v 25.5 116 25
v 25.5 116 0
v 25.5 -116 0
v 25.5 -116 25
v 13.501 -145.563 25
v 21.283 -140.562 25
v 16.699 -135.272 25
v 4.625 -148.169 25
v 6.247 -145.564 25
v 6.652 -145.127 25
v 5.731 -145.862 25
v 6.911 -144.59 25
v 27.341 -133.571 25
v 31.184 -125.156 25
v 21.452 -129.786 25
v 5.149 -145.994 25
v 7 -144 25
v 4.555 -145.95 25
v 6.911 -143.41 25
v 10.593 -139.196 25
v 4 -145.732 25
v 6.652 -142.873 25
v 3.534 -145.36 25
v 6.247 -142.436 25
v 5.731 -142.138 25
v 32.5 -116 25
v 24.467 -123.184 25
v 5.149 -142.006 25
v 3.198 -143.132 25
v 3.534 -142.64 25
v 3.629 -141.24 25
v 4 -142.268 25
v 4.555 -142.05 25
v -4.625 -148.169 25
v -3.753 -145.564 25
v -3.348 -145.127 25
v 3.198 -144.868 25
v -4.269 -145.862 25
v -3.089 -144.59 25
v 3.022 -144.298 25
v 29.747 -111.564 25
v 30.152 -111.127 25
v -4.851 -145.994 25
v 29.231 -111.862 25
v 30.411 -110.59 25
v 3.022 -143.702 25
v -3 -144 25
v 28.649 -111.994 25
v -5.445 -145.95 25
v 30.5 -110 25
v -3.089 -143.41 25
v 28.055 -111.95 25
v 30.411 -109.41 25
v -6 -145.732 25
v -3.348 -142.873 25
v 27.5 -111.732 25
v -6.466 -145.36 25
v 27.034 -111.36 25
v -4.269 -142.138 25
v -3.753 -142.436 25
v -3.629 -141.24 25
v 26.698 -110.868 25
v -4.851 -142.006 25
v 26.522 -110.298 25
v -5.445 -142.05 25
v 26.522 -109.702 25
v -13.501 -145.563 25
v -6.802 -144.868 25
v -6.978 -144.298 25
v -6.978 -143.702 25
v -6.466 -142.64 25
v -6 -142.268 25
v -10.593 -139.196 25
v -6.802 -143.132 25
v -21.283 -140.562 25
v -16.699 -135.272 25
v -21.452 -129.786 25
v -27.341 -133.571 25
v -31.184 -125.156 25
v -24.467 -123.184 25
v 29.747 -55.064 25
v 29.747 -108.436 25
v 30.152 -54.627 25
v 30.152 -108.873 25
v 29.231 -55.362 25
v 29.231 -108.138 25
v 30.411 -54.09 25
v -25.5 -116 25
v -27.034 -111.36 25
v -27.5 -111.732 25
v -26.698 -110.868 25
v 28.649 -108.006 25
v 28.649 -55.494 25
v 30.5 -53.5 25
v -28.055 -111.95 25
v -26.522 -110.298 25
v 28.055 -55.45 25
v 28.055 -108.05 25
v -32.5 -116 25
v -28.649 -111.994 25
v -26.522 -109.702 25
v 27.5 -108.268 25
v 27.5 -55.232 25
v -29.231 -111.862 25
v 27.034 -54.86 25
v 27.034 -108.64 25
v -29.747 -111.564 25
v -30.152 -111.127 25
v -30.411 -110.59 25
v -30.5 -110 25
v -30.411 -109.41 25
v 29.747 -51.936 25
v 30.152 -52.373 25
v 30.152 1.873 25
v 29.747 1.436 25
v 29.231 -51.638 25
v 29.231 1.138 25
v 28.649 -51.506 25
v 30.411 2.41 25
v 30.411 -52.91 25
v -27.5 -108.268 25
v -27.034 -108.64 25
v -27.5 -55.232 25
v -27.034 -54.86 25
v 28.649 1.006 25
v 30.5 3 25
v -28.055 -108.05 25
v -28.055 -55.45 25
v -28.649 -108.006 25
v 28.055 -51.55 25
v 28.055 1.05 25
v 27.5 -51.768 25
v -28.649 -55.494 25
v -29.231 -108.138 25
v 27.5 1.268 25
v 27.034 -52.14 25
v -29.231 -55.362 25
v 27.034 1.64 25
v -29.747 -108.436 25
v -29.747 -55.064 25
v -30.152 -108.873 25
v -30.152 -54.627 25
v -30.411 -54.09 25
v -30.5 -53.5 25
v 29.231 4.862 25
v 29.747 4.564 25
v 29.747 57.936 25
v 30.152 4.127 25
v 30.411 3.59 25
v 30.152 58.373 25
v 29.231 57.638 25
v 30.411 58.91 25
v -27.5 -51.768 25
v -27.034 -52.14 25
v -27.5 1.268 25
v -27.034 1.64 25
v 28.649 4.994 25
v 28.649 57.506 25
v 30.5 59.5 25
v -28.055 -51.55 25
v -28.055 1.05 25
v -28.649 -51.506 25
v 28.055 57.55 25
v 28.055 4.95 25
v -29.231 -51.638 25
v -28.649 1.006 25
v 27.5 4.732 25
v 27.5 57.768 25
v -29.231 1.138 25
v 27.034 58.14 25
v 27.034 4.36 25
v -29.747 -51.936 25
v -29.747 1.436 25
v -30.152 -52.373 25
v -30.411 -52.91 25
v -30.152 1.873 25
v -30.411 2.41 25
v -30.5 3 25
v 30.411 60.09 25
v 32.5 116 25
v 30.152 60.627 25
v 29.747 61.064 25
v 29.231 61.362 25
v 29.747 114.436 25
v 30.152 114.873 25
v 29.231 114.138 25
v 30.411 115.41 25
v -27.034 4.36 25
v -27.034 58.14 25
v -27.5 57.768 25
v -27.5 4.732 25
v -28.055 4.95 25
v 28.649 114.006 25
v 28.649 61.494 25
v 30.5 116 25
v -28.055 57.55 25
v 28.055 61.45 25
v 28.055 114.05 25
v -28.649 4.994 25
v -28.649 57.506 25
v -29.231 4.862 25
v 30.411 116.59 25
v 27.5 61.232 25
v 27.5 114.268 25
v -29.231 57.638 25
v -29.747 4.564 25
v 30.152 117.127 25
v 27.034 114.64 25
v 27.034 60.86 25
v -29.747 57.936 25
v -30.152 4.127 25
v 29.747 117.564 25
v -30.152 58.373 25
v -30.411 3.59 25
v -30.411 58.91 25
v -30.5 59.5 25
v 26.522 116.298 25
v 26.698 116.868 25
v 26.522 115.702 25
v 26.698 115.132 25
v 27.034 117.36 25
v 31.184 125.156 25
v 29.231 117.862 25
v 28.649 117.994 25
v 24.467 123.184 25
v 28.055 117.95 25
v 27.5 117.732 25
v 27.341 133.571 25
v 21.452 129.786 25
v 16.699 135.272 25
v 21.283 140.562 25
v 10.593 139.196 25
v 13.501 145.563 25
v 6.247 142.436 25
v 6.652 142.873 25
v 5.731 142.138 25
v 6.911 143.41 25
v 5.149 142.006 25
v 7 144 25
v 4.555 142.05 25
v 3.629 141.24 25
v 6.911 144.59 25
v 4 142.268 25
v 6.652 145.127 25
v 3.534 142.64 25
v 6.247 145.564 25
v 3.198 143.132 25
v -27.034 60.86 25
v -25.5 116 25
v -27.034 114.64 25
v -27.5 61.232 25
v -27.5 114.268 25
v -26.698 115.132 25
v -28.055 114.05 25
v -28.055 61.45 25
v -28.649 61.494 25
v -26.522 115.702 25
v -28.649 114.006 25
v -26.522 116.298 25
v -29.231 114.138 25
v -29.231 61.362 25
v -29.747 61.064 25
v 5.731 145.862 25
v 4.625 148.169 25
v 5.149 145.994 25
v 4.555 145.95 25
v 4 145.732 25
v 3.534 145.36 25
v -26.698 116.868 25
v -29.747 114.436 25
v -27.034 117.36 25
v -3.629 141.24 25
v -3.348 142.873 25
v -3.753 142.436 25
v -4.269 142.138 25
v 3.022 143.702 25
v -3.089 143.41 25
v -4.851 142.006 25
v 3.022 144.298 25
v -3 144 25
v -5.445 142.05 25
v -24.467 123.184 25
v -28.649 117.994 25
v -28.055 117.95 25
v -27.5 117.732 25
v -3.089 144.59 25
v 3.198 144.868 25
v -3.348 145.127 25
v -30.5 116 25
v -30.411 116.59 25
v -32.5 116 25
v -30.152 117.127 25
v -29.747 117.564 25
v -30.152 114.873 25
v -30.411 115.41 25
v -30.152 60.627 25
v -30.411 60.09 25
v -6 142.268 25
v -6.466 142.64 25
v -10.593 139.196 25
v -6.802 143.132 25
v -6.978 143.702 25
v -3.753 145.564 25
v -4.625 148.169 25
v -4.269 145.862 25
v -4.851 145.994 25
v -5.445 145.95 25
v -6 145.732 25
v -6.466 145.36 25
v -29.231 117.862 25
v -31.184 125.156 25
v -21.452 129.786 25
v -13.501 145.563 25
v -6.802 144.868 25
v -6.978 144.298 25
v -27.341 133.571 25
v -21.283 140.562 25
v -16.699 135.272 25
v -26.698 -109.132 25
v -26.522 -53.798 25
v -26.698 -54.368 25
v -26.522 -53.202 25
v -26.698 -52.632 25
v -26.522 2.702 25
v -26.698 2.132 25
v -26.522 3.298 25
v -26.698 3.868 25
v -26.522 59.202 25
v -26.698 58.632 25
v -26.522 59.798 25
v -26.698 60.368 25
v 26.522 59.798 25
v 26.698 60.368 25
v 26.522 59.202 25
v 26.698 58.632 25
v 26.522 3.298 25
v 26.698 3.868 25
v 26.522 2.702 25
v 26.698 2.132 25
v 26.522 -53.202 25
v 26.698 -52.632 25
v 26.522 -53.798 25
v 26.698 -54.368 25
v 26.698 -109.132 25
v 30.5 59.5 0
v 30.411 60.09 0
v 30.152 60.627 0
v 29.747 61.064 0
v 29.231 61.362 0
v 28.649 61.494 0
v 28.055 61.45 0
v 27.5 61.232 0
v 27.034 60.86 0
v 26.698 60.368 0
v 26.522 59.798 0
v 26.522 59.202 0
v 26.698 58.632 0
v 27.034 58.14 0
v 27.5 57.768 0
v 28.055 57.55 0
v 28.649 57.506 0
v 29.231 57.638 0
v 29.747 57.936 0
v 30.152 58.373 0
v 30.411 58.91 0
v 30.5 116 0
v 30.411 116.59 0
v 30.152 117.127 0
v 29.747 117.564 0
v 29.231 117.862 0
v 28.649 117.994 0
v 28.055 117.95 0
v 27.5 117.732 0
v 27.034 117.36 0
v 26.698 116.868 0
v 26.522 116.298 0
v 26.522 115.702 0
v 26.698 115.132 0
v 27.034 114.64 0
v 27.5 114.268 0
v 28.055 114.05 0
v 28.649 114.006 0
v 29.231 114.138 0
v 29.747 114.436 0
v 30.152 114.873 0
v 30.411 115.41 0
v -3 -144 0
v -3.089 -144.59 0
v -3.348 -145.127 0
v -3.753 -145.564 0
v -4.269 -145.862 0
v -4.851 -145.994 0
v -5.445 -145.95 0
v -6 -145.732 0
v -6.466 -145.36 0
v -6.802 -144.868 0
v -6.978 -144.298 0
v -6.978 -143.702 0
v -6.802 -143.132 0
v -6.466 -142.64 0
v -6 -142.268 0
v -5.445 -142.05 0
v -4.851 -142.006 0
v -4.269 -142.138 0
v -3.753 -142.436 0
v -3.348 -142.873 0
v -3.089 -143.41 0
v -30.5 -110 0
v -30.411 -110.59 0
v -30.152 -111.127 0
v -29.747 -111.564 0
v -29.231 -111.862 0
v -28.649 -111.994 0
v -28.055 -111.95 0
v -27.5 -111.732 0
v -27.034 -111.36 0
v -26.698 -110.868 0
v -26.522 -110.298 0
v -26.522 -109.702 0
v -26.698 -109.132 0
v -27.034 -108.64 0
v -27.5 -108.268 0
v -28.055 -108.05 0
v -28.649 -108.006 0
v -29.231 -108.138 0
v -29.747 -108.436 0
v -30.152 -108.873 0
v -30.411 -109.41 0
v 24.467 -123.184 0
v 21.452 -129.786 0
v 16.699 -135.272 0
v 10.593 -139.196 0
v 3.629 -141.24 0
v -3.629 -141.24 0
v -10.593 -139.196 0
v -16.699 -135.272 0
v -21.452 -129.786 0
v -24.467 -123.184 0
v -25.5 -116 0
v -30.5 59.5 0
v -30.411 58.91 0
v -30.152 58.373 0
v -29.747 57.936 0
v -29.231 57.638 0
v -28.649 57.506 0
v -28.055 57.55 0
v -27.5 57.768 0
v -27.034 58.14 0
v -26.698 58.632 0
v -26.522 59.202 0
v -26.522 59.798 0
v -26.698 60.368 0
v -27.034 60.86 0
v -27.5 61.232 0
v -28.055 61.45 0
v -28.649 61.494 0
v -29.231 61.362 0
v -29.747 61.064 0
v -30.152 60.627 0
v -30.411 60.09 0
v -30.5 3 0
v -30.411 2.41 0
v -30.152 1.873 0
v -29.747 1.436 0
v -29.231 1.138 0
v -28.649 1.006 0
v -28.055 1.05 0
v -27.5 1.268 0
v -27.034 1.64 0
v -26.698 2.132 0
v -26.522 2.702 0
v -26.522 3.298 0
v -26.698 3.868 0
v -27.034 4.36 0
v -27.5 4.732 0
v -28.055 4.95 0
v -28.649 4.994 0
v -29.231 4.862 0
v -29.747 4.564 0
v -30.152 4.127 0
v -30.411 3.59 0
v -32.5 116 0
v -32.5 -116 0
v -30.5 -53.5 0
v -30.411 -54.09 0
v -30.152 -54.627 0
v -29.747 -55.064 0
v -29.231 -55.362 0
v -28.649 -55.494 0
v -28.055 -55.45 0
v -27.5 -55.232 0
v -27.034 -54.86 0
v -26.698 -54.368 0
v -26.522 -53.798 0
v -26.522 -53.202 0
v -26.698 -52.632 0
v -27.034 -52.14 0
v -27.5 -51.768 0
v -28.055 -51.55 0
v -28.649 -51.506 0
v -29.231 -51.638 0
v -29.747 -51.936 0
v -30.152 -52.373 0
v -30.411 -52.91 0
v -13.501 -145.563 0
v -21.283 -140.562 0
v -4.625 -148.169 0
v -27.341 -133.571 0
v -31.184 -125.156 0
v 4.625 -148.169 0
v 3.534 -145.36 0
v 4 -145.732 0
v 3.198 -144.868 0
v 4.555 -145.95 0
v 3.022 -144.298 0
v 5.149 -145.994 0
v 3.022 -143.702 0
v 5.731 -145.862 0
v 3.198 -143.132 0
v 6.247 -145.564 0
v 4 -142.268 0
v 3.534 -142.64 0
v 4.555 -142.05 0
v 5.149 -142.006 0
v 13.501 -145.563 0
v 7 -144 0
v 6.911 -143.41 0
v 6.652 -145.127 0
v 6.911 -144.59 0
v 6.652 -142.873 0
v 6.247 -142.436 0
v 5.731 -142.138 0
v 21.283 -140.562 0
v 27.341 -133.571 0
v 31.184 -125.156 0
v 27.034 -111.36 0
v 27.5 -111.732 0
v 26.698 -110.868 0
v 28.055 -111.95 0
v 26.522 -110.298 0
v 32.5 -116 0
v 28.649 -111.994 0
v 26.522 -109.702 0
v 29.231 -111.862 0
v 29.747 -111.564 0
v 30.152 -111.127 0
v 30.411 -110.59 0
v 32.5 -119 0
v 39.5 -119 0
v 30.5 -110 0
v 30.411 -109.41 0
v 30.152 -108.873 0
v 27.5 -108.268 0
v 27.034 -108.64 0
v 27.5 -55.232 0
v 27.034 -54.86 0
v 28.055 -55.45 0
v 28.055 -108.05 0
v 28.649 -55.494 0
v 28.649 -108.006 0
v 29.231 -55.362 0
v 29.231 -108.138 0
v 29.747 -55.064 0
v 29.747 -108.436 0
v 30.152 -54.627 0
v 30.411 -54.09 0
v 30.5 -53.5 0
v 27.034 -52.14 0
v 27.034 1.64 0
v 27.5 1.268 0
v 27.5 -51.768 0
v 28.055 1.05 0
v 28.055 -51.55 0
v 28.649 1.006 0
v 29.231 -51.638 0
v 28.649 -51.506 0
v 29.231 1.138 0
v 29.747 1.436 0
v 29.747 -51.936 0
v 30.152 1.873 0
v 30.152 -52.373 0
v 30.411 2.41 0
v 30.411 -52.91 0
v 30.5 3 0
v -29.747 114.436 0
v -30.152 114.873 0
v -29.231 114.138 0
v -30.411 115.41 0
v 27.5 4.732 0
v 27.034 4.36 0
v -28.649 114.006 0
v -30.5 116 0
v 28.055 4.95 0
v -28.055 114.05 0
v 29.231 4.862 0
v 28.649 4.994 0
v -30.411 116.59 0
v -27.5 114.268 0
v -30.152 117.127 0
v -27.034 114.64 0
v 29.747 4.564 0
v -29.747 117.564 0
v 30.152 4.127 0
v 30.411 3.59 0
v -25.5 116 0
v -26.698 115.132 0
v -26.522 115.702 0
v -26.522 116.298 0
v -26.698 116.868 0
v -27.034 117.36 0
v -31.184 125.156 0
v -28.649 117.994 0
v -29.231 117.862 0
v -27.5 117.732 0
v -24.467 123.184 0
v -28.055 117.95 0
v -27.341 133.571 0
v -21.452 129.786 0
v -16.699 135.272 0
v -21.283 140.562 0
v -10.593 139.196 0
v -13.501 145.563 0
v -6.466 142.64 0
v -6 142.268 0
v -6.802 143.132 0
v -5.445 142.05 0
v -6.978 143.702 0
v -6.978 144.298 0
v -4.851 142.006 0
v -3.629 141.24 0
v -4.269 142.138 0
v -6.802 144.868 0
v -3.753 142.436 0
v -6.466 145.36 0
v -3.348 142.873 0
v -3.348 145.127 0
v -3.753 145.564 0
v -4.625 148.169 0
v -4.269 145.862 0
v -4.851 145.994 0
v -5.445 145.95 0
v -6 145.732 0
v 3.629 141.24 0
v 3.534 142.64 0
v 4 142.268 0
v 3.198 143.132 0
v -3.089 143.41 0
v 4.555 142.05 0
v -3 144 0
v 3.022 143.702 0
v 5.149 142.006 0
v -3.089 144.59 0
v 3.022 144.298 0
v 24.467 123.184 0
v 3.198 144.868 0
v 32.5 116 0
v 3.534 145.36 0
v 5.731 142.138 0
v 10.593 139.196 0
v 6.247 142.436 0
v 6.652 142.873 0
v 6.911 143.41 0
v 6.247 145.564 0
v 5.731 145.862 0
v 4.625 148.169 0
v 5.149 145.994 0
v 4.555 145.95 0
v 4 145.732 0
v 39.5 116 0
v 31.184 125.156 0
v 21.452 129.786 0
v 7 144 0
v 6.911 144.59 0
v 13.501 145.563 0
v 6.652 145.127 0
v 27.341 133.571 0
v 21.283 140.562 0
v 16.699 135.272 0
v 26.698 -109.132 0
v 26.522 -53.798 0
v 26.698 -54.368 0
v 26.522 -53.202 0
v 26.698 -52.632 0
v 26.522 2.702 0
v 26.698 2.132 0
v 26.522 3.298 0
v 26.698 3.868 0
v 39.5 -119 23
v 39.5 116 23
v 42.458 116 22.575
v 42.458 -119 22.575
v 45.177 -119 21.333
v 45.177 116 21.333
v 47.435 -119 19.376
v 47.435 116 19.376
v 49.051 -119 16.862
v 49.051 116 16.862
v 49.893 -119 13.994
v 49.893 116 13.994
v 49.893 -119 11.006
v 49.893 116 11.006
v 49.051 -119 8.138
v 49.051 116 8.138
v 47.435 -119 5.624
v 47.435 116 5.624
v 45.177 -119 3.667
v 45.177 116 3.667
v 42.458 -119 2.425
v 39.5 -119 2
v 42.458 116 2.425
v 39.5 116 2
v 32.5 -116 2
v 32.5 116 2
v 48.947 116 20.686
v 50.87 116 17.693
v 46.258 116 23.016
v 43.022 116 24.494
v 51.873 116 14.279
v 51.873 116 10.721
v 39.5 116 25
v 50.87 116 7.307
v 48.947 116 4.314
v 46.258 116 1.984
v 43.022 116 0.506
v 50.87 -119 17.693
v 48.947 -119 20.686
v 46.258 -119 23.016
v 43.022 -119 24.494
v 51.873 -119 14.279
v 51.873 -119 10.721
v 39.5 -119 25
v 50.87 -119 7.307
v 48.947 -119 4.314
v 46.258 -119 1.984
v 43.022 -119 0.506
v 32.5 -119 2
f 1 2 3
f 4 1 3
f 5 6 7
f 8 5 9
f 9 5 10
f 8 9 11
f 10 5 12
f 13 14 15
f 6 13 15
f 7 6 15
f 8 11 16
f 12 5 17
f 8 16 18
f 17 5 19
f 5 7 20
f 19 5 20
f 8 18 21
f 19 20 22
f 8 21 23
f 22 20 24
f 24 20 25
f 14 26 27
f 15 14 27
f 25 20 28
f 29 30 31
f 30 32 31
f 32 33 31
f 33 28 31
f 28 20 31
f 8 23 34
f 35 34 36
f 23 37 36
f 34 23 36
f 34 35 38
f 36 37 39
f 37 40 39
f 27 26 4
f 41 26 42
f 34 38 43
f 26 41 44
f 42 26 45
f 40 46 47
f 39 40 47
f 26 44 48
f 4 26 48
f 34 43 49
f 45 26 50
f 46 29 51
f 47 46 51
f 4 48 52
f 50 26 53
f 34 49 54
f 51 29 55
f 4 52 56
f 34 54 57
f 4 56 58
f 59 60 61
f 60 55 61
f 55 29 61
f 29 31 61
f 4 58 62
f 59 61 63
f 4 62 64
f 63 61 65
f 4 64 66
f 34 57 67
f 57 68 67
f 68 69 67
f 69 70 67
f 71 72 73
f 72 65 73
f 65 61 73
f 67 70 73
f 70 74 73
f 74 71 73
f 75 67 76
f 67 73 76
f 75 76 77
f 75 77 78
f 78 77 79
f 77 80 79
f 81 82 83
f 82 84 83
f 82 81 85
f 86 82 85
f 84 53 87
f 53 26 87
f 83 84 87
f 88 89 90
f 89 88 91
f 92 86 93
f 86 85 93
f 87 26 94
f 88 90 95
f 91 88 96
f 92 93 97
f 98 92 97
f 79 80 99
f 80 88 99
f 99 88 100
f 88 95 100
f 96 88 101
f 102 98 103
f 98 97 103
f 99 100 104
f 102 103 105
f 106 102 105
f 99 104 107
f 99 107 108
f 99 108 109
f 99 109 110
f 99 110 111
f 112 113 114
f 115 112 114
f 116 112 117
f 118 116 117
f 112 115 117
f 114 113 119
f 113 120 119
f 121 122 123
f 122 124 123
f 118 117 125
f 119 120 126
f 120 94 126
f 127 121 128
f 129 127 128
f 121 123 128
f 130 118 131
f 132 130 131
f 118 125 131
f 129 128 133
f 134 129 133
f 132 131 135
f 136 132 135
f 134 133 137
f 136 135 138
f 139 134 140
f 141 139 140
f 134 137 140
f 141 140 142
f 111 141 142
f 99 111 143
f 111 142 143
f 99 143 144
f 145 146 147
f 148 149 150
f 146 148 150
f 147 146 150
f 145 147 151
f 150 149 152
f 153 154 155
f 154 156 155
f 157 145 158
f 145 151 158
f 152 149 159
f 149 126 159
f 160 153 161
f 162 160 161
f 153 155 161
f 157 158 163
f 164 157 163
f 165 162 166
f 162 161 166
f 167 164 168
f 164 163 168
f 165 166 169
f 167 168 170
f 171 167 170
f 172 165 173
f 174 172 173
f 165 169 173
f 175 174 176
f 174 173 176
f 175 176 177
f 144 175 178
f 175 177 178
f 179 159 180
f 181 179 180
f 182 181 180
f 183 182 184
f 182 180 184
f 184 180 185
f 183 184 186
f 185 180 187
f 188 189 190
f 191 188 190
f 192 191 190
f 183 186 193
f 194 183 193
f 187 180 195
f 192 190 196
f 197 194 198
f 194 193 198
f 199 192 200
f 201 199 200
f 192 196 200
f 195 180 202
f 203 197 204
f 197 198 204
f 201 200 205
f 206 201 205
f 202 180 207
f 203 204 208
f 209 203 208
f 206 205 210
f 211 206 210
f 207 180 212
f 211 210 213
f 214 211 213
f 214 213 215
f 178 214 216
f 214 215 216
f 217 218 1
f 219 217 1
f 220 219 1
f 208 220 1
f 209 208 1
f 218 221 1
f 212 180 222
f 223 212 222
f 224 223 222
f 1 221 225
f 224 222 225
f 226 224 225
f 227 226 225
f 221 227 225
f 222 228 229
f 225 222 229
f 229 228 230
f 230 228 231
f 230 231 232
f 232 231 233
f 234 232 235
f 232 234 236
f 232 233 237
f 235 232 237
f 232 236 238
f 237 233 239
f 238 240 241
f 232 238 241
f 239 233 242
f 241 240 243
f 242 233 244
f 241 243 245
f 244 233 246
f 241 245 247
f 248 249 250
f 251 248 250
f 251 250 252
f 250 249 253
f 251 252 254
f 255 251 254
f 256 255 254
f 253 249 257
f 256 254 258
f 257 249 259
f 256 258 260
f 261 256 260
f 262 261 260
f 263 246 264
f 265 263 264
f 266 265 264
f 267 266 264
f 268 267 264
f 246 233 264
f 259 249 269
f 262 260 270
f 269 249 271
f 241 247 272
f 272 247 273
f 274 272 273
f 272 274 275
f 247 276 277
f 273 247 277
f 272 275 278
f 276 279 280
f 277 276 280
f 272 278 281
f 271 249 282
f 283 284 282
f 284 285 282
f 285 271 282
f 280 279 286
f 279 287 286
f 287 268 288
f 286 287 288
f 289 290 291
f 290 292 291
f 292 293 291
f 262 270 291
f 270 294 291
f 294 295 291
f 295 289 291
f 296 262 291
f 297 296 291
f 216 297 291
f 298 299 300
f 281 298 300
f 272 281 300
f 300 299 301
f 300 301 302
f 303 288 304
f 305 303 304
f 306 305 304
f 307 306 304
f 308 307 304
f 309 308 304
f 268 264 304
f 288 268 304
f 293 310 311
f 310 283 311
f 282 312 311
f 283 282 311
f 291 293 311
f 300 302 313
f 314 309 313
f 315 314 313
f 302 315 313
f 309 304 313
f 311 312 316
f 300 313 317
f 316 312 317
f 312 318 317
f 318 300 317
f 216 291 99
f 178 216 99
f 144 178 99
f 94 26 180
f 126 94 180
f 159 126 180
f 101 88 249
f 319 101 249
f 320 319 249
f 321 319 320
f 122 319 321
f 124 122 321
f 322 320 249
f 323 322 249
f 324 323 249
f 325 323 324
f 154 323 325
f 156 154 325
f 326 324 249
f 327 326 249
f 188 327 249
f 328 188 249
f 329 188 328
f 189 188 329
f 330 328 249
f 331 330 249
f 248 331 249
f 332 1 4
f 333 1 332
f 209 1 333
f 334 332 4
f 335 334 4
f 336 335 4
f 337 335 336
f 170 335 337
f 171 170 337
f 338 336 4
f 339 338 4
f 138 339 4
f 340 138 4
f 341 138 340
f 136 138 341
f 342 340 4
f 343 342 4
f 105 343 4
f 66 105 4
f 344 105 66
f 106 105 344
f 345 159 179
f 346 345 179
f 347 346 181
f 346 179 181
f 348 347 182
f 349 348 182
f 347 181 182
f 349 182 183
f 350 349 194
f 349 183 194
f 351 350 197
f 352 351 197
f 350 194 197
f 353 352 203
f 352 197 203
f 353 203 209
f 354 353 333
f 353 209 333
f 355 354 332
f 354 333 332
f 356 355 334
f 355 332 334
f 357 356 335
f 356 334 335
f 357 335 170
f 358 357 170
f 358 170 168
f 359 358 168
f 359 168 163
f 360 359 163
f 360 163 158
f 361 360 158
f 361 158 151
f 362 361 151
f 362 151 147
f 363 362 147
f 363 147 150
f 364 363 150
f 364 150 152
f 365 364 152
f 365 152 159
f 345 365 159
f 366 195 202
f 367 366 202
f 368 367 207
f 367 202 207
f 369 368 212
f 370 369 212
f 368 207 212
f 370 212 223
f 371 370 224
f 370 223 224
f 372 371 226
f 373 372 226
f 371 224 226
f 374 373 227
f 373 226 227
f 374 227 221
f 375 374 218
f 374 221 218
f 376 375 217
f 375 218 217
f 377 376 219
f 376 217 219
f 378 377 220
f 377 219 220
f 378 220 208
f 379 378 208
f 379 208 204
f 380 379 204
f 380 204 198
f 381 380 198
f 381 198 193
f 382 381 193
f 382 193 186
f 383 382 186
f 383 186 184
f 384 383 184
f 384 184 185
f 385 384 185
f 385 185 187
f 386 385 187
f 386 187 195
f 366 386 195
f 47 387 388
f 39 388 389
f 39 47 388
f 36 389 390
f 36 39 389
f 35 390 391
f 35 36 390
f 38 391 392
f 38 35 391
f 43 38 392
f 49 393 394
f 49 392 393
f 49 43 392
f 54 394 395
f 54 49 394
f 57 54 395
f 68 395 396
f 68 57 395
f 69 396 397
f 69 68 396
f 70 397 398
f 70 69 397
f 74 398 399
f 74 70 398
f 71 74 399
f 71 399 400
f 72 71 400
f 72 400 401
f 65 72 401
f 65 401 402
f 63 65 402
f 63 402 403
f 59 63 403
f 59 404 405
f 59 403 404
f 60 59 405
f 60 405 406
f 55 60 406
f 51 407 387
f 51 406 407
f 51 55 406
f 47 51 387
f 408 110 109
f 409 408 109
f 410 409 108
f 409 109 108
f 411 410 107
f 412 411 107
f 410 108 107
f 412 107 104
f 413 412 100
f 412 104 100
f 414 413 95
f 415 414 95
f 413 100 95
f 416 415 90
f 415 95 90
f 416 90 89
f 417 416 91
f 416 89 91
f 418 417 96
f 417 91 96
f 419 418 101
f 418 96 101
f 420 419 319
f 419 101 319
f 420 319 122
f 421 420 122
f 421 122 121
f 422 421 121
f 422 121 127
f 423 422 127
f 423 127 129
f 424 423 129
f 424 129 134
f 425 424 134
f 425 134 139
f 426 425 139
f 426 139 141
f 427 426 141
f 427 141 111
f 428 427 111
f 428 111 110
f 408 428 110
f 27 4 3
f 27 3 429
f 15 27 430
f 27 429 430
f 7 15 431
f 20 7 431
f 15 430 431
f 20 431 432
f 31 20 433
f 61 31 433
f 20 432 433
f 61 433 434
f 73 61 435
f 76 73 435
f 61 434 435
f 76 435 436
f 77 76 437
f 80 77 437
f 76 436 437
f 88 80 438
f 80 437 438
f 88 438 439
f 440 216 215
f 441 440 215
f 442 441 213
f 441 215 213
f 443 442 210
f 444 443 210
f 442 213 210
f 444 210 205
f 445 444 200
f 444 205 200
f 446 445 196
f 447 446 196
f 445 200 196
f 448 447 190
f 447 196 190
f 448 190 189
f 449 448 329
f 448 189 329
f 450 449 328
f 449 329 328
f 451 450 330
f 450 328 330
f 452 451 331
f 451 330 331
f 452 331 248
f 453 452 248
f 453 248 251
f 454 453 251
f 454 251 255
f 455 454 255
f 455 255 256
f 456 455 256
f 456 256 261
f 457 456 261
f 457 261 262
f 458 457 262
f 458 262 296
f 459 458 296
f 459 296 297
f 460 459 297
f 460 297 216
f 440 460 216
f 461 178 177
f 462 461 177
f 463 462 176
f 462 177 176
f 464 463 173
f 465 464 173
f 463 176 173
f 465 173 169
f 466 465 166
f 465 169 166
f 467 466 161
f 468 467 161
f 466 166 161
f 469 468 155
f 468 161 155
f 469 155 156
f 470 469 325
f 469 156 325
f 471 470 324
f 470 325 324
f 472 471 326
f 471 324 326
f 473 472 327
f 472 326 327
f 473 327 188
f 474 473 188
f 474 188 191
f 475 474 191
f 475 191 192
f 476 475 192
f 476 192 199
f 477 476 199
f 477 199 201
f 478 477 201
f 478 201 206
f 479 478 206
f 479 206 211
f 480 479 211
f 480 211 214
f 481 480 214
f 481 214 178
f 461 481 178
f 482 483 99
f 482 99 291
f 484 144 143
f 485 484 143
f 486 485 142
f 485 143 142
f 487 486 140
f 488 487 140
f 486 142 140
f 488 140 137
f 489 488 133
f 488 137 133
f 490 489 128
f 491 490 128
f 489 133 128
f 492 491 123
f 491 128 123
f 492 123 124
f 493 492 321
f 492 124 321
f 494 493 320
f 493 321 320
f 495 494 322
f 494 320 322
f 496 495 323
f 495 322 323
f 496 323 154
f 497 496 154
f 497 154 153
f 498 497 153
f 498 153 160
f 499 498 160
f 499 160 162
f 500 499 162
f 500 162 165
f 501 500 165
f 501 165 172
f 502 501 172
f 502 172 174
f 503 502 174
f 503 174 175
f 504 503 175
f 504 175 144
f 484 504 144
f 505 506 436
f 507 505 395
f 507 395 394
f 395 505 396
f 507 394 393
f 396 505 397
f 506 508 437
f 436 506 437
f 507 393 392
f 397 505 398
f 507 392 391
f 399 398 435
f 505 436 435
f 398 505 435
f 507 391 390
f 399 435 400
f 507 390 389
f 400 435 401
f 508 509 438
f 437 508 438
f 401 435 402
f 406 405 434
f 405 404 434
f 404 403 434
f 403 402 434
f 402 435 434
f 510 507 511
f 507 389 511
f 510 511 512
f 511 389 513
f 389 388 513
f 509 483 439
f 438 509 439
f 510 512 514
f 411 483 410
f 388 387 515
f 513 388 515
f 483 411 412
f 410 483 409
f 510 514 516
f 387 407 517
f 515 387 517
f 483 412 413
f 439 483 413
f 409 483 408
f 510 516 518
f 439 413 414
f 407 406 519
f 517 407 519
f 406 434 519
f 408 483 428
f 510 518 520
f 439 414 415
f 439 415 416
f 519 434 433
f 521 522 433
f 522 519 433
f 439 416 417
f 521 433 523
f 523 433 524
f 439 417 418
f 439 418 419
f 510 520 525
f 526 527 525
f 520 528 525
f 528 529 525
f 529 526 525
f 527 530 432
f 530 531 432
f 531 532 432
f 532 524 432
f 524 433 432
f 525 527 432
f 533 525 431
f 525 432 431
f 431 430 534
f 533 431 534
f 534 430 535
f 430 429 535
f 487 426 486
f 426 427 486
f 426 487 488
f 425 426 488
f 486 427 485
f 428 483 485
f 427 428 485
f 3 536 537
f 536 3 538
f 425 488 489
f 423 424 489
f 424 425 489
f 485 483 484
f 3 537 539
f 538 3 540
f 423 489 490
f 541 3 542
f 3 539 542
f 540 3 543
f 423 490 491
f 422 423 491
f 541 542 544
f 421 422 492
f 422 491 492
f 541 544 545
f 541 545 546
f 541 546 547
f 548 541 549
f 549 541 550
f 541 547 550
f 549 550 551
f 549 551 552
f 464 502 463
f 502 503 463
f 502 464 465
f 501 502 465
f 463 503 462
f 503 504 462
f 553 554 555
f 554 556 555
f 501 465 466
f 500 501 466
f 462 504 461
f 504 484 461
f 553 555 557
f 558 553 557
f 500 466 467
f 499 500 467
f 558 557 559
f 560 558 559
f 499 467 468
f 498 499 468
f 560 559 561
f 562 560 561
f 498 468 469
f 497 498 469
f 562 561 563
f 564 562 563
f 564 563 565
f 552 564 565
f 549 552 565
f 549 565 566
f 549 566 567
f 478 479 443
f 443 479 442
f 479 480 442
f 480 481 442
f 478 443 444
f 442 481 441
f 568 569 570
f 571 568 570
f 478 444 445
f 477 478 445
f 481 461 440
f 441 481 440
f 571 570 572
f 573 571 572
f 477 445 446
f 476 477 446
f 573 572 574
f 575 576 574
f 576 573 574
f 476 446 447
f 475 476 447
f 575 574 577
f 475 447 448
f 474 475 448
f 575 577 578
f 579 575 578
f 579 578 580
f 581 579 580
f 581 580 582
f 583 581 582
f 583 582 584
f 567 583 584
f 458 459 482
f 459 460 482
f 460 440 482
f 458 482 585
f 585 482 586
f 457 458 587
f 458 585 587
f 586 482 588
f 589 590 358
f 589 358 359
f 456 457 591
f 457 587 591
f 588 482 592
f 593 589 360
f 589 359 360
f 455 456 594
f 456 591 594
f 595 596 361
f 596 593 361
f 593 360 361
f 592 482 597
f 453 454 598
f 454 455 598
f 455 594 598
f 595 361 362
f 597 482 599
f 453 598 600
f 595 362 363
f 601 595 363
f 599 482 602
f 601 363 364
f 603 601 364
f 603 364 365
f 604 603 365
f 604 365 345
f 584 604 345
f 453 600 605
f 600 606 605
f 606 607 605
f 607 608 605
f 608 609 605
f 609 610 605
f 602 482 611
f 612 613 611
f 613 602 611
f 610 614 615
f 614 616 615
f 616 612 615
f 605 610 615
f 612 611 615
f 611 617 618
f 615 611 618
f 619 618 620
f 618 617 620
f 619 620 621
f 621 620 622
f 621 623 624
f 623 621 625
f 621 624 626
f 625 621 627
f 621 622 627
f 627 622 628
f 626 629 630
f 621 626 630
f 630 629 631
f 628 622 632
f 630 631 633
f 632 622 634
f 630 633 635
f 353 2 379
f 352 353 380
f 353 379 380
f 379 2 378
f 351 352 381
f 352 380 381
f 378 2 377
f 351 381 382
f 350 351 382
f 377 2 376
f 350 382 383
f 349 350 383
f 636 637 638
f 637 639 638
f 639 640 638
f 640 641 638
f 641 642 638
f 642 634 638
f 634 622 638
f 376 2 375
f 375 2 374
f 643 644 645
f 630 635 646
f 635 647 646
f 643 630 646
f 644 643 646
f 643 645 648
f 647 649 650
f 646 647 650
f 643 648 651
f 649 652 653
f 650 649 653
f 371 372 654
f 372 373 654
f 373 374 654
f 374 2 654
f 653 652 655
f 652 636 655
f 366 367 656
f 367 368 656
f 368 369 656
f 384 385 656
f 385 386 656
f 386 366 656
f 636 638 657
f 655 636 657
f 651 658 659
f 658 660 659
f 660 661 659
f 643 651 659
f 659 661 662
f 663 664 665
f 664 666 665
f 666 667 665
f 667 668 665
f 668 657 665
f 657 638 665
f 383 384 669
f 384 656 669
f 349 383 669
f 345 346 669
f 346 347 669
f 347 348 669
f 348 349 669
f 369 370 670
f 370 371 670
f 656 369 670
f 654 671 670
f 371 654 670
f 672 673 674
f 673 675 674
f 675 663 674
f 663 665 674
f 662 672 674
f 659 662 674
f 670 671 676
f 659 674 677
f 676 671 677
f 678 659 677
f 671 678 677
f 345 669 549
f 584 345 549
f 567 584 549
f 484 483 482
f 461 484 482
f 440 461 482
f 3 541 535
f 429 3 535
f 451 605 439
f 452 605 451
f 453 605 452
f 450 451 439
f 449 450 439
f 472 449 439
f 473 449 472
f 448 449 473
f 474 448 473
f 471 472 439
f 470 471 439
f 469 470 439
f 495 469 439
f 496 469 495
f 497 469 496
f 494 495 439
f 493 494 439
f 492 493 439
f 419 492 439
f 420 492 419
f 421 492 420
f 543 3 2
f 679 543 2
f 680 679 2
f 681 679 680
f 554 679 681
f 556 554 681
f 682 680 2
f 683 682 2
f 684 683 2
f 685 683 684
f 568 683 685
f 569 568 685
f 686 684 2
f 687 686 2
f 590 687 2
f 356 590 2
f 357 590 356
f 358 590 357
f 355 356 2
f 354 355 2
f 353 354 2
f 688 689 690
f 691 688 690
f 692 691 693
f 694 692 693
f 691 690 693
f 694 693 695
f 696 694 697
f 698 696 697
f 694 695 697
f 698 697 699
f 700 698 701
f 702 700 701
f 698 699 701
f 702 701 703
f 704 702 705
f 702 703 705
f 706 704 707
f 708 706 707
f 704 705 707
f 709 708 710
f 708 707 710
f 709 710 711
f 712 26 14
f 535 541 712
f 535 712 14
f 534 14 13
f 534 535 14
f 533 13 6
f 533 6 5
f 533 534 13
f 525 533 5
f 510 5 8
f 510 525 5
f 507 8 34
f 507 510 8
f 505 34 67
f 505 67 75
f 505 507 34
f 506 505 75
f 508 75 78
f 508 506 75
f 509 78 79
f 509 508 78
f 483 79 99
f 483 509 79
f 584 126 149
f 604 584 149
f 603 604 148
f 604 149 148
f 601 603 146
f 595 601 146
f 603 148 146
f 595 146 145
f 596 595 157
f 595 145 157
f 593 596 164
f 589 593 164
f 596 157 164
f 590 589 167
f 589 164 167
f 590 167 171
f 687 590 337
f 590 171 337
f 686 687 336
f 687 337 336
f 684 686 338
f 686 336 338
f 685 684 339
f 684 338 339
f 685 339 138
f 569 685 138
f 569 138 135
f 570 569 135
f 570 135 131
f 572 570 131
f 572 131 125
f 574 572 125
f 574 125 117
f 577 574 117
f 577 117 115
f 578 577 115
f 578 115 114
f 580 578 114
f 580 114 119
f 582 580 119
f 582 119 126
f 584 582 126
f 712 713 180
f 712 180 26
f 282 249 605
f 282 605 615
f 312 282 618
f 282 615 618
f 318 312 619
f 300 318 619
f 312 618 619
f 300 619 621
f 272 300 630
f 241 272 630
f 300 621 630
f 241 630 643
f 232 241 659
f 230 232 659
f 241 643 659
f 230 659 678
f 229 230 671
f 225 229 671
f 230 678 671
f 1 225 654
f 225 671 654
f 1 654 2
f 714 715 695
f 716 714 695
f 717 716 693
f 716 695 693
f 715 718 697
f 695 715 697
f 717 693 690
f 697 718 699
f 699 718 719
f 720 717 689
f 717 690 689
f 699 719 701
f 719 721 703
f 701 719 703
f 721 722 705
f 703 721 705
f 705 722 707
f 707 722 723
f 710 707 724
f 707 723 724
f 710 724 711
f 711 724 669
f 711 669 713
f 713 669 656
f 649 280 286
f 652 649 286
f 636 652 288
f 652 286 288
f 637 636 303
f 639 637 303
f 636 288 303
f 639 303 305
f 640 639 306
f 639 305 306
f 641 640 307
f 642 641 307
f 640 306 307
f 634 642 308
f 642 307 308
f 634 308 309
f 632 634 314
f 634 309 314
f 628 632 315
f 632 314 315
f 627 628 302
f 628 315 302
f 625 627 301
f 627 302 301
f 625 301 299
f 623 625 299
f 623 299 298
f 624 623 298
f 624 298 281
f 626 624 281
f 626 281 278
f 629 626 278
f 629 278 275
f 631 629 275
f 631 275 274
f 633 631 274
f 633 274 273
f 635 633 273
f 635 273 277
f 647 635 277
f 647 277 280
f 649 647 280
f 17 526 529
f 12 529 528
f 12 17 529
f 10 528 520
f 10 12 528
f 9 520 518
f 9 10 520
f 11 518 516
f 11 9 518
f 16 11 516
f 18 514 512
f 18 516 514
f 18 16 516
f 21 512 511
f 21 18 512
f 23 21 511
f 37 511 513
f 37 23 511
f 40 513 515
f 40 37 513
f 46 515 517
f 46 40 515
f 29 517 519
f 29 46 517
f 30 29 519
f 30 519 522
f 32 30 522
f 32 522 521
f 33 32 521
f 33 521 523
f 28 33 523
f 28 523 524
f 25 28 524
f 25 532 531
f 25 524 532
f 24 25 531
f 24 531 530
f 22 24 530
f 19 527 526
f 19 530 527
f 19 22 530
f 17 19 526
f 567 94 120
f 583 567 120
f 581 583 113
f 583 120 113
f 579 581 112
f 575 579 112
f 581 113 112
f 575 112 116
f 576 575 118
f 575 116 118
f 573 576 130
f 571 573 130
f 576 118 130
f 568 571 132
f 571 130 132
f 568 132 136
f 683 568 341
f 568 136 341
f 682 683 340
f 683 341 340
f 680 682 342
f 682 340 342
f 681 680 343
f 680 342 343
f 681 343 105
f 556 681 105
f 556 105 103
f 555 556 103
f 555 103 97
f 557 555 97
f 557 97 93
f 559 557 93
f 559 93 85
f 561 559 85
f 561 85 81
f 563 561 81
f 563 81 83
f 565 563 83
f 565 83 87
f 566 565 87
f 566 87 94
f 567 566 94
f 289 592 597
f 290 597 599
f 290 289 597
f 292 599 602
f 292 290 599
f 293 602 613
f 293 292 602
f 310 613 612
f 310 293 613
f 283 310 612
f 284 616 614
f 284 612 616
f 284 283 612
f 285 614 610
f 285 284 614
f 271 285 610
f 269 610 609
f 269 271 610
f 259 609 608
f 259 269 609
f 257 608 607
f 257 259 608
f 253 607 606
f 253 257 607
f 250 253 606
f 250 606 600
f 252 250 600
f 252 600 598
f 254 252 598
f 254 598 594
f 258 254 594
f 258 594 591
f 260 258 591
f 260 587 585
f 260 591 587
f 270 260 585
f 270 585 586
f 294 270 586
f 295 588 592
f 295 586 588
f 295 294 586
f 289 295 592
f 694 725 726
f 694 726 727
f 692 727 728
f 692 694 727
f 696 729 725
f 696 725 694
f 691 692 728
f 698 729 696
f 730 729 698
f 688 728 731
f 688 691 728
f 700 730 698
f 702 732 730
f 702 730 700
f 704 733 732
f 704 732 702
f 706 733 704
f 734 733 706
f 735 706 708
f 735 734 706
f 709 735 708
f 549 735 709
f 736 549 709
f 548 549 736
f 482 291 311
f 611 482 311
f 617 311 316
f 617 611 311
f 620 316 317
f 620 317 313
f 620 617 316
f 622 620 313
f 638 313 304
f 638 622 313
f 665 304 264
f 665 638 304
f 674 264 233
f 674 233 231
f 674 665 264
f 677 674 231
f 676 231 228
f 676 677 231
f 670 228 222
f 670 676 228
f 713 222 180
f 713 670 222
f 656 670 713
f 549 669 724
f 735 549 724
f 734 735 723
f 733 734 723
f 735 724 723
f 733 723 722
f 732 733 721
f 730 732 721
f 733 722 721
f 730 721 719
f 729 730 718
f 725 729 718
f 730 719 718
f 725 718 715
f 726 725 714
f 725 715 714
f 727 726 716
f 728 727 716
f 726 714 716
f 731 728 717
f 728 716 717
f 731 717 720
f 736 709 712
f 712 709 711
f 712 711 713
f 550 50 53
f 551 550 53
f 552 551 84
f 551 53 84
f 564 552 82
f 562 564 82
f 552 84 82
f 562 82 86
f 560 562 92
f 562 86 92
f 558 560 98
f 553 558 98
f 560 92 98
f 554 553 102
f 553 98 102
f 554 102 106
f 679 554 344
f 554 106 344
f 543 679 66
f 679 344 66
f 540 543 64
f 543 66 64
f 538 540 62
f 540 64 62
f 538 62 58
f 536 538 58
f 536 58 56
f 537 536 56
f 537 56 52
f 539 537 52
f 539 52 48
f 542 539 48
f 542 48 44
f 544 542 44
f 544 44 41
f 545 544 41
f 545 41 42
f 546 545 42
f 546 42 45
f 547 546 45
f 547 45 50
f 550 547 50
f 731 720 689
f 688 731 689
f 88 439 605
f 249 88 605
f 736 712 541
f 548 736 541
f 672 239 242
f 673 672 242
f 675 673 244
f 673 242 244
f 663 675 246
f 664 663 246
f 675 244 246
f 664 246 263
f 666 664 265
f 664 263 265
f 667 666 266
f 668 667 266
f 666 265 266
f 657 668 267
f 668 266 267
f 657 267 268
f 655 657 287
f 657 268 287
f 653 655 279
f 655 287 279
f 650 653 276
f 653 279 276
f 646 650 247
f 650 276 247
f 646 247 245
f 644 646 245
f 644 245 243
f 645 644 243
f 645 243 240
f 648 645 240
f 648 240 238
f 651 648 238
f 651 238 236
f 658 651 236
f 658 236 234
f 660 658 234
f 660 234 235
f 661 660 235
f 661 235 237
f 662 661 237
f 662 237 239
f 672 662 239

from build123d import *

# Parameters (mm, degrees)
BOSS_EXTRUDE1_DEPTH     = 25
SKETCH2_R               = 2
CUT_EXTRUDE1_DEPTH      = 155.056807704
SKETCH4_R               = 2
CUT_EXTRUDE2_DEPTH      = 155.056807704
LPATTERN1_COUNT         = 5
LPATTERN1_PITCH         = 56.5
MIRROR2_COPY_1_SKETCH_R = 2
MIRROR2_COPY_1_DEPTH    = 155.056807704
MIRROR2_COPY_2_SKETCH_R = 2
MIRROR2_COPY_2_DEPTH    = 155.056807704
MIRROR2_COPY_3_SKETCH_R = 2
MIRROR2_COPY_3_DEPTH    = 155.056807704
MIRROR2_COPY_4_SKETCH_R = 2
MIRROR2_COPY_4_DEPTH    = 155.056807704
BOSS_EXTRUDE2_DEPTH     = 235


with BuildPart() as part:
    # Sketch1 → Boss-Extrude1 (new body)
    with BuildSketch(Plane.XY):
        with BuildLine():
            Line((-32.5, -116), (-32.5, 116))
            ThreePointArc((-32.5, 116), (0, 148.5), (32.5, 116))
            Line((32.5, 116), (32.5, -116))
            ThreePointArc((32.5, -116), (0, -148.5), (-32.5, -116))
        make_face()
        with BuildLine():
            Line((-25.5, -116), (-25.5, 116))
            ThreePointArc((-25.5, 116), (0, 141.5), (25.5, 116))
            Line((25.5, 116), (25.5, -116))
            ThreePointArc((25.5, -116), (0, -141.5), (-25.5, -116))
        make_face(mode=Mode.SUBTRACT)
    extrude(amount=BOSS_EXTRUDE1_DEPTH)

    # Sketch2 → Cut-Extrude1 (cut, through all)
    with BuildSketch(Plane.XY.offset(25)):
        with Locations((-5, 144)):
            Circle(SKETCH2_R)
        with Locations((5, 144)):
            Circle(SKETCH2_R)
    cut_extrude1 = extrude(amount=-CUT_EXTRUDE1_DEPTH, mode=Mode.SUBTRACT)

    # Mirror1: Cut-Extrude1 across plane
    add(cut_extrude1.mirror(Plane.ZX), mode=Mode.SUBTRACT)

    # Sketch4 → Cut-Extrude2 (cut, through all)
    with BuildSketch(Plane.XY.offset(25)):
        with Locations((28.5, 116)):
            Circle(SKETCH4_R)
    cut_extrude2 = extrude(amount=-CUT_EXTRUDE2_DEPTH, mode=Mode.SUBTRACT)

    # LPattern1: Cut-Extrude2 ×5
    with Locations(*[(0, -i * LPATTERN1_PITCH, 0) for i in range(1, LPATTERN1_COUNT)]):
        add(cut_extrude2, mode=Mode.SUBTRACT)

    # Mirror2: Cut-Extrude2 across plane
    add(cut_extrude2.mirror(Plane(origin=(0, 0, 0), x_dir=(0, 0, 1), z_dir=(1, 0, 0))), mode=Mode.SUBTRACT)

    # Mirror2 copy 1 sketch → Mirror2 copy 1 (cut, through all)
    with BuildSketch(Plane(origin=(0, -56.5, 25), x_dir=(-1, 0, 0), z_dir=(0, 0, 1))):
        with Locations((28.5, -116)):
            Circle(MIRROR2_COPY_1_SKETCH_R)
    extrude(amount=-MIRROR2_COPY_1_DEPTH, mode=Mode.SUBTRACT)

    # Mirror2 copy 2 sketch → Mirror2 copy 2 (cut, through all)
    with BuildSketch(Plane(origin=(0, -113, 25), x_dir=(-1, 0, 0), z_dir=(0, 0, 1))):
        with Locations((28.5, -116)):
            Circle(MIRROR2_COPY_2_SKETCH_R)
    extrude(amount=-MIRROR2_COPY_2_DEPTH, mode=Mode.SUBTRACT)

    # Mirror2 copy 3 sketch → Mirror2 copy 3 (cut, through all)
    with BuildSketch(Plane(origin=(0, -169.5, 25), x_dir=(-1, 0, 0), z_dir=(0, 0, 1))):
        with Locations((28.5, -116)):
            Circle(MIRROR2_COPY_3_SKETCH_R)
    extrude(amount=-MIRROR2_COPY_3_DEPTH, mode=Mode.SUBTRACT)

    # Mirror2 copy 4 sketch → Mirror2 copy 4 (cut, through all)
    with BuildSketch(Plane(origin=(0, -226, 25), x_dir=(-1, 0, 0), z_dir=(0, 0, 1))):
        with Locations((28.5, -116)):
            Circle(MIRROR2_COPY_4_SKETCH_R)
    extrude(amount=-MIRROR2_COPY_4_DEPTH, mode=Mode.SUBTRACT)

    # Sketch5 → Boss-Extrude2 (add)
    with BuildSketch(Plane(origin=(32.5, 116, 0), x_dir=(1, 0, 0), z_dir=(0, 1, 0))):
        with BuildLine():
            Line((0, 0), (7, 0))
            ThreePointArc((7, 0), (19.5, -12.5), (7, -25))
            Line((7, -25), (7, -23))
            ThreePointArc((7, -23), (17.5, -12.5), (7, -2))
            Line((7, -2), (0, -2))
            Line((0, -2), (0, 0))
        make_face()
    extrude(amount=-BOSS_EXTRUDE2_DEPTH)


solid = part.part
